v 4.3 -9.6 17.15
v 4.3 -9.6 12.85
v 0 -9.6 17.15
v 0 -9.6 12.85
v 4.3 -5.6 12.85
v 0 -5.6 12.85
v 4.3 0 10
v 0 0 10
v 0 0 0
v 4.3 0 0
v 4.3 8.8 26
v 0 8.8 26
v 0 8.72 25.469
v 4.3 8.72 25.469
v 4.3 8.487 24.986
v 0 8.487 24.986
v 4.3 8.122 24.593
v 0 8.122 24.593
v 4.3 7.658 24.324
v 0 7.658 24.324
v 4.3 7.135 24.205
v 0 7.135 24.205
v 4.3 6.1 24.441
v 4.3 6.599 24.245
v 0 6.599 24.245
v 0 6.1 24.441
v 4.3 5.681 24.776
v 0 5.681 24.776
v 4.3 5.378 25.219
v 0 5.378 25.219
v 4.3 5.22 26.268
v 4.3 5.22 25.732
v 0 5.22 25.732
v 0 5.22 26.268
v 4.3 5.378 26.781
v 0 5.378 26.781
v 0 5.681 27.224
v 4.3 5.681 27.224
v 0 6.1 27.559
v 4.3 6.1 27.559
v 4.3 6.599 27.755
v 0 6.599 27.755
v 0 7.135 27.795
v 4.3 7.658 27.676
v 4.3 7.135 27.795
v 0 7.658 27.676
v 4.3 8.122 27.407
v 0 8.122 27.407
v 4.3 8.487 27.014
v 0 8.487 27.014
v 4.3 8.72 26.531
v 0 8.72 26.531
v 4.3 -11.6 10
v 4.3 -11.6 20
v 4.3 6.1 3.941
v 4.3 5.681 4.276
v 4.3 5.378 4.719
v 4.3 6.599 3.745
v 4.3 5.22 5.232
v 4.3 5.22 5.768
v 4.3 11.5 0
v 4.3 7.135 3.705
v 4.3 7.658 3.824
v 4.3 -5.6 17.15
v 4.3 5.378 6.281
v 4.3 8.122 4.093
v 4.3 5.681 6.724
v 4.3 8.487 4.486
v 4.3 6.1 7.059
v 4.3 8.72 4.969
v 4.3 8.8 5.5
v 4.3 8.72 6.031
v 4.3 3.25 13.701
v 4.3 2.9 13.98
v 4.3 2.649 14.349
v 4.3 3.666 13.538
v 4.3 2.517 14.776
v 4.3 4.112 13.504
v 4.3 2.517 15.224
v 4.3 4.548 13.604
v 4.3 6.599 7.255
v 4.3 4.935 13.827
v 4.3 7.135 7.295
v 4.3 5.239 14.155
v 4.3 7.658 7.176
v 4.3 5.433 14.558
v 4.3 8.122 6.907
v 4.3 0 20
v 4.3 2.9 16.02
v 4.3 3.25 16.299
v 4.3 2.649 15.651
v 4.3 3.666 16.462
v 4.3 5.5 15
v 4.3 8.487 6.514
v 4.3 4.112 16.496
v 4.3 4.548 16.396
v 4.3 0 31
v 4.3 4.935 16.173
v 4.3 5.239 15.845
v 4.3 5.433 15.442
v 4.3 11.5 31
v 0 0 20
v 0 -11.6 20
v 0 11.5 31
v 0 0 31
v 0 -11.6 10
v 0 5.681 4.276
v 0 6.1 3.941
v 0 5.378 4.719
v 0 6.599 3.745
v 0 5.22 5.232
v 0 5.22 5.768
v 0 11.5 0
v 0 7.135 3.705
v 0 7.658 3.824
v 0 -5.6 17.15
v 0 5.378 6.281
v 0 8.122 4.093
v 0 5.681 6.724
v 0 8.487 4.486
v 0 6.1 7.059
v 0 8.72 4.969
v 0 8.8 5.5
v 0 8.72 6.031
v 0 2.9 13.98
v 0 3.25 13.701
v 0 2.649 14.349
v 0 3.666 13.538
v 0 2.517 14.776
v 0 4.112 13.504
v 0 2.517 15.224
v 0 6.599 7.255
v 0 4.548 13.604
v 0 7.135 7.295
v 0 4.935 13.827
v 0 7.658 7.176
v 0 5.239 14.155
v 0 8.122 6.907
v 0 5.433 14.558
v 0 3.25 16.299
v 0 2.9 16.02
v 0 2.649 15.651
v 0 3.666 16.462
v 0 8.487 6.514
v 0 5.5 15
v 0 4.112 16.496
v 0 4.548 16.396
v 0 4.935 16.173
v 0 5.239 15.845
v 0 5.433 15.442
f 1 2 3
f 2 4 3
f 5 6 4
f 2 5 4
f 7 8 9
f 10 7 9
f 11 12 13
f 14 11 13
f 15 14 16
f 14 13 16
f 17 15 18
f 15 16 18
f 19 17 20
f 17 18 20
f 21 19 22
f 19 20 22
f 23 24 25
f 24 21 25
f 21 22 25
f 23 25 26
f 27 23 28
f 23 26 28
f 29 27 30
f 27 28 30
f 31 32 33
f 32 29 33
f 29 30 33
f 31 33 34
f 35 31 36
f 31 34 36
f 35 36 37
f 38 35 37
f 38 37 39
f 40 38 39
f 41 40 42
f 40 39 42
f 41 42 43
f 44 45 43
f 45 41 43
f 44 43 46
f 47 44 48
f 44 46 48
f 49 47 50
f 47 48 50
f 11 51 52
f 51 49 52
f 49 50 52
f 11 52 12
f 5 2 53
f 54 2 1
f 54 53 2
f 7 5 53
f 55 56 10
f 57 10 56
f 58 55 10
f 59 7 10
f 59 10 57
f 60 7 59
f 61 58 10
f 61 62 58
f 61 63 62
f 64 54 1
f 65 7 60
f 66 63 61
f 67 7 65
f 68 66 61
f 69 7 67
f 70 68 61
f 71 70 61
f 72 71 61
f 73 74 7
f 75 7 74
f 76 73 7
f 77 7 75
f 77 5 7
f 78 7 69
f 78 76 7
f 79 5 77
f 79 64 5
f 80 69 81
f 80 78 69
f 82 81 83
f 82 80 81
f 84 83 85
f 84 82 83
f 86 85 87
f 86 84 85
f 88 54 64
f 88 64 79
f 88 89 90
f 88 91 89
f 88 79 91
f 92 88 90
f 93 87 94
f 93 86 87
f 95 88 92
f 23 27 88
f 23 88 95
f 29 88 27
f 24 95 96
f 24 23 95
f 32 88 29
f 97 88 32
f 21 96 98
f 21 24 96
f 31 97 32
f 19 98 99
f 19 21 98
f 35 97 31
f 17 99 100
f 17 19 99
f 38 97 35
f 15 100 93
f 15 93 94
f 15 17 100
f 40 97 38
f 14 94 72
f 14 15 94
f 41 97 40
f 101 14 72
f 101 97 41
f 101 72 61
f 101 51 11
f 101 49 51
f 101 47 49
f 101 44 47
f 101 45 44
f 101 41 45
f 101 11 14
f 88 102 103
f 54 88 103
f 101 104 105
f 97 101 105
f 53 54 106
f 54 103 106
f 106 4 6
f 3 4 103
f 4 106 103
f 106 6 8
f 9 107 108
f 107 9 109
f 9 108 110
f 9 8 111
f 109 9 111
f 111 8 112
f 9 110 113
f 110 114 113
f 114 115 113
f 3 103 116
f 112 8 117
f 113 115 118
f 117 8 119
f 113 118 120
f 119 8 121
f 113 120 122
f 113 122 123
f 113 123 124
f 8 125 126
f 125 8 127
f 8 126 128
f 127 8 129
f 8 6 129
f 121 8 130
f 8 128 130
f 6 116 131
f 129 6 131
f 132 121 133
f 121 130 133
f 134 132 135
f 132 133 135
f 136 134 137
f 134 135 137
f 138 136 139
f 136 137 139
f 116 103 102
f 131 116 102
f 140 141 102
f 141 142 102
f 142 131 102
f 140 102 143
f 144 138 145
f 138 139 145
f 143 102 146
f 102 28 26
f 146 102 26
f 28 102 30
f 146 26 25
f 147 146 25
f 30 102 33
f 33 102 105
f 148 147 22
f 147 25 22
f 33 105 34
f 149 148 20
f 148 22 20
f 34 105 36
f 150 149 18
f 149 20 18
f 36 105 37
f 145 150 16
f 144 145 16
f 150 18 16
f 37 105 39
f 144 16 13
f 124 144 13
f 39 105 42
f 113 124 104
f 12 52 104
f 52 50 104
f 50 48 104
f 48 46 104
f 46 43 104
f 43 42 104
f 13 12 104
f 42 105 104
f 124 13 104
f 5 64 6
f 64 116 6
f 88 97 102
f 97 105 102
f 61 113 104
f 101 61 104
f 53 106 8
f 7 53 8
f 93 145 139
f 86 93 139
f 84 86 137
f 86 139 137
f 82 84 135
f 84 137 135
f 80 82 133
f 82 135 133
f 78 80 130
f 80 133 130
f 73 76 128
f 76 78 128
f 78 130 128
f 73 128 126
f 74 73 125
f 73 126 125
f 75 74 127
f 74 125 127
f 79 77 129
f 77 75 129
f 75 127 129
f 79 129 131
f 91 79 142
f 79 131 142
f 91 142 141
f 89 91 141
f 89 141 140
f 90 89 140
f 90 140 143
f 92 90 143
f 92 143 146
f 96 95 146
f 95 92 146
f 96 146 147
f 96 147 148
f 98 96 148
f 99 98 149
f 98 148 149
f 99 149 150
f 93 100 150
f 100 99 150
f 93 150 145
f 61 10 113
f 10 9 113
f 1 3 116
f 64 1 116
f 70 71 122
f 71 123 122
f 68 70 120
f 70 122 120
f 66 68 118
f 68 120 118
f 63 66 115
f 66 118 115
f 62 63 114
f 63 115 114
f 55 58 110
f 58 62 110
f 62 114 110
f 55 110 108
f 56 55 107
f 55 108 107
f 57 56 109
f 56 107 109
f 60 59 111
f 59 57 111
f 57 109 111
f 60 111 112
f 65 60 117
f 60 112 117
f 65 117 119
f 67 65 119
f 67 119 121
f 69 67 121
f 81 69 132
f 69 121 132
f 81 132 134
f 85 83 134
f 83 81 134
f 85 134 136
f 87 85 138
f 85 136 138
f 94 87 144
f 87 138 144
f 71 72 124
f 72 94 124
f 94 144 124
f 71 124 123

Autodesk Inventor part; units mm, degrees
ref_plane "YZ Plane" through (0, 0, 0) normal (1, 0, 0) x (0, 1, 0)
ref_plane "XZ Plane" through (0, 0, 0) normal (0, 1, 0) x (-1, 0, 0)
ref_plane "XY Plane" through (0, 0, 0) normal (0, 0, 1) x (1, 0, 0)
sketch "Sketch1" plane through (0, 0, 0) normal (1, 0, 0) x (0, 1, 0)
  line L0 (0, 0) -> (11.5, 0)
  line L1 (11.5, 0) -> (11.5, 31)
  line L2 (11.5, 31) -> (0, 31)
  line L3 (0, 20) -> (-11.6, 20)
  line L4 (-11.6, 20) -> (-11.6, 10)
  line L5 (-11.6, 10) -> (0, 10)
  line L6 (0, 31) -> (0, 20)
  line L7 (0, 10) -> (0, 0)
  line L8 (7, 31) -> (7, 0) construction
  circle A0 centre (7, 26) radius 1.8
  circle A1 centre (7, 5.5) radius 1.8
  line L9 (-11.6, 15) -> (4, 15) construction
  circle A2 centre (4, 15) radius 1.5
  line L10 (-5.6, 12.85) -> (-9.6, 12.85)
  line L11 (-9.6, 12.85) -> (-9.6, 17.15)
  line L12 (-9.6, 17.15) -> (-5.6, 17.15)
  line L13 (-5.6, 17.15) -> (-5.6, 12.85)
  line L14 (-5.6, 12.85) -> (-9.6, 17.15) construction
  line L15 (-9.6, 12.85) -> (-5.6, 17.15) construction
  point P0 (-7.6, 15)
  dimension "d0" = 10
  dimension "d4" = 11.5
  dimension "d7" = 20.5
  dimension "d8" = 3.6
  dimension "d10" = 7
  dimension "d11" = 3
  dimension "d12" = 4
  dimension "d13" = 9.5
  dimension "d14" = 16
  dimension "d15" = 15
  dimension "d16" = 5.6
  dimension "d17" = 4
  dimension "d18" = 4.3
  dimension "d19" = 2
extrude "Extrusion1" add sketch "Sketch1" along normal blind 4.3
properties part number "TrayPanelI"
